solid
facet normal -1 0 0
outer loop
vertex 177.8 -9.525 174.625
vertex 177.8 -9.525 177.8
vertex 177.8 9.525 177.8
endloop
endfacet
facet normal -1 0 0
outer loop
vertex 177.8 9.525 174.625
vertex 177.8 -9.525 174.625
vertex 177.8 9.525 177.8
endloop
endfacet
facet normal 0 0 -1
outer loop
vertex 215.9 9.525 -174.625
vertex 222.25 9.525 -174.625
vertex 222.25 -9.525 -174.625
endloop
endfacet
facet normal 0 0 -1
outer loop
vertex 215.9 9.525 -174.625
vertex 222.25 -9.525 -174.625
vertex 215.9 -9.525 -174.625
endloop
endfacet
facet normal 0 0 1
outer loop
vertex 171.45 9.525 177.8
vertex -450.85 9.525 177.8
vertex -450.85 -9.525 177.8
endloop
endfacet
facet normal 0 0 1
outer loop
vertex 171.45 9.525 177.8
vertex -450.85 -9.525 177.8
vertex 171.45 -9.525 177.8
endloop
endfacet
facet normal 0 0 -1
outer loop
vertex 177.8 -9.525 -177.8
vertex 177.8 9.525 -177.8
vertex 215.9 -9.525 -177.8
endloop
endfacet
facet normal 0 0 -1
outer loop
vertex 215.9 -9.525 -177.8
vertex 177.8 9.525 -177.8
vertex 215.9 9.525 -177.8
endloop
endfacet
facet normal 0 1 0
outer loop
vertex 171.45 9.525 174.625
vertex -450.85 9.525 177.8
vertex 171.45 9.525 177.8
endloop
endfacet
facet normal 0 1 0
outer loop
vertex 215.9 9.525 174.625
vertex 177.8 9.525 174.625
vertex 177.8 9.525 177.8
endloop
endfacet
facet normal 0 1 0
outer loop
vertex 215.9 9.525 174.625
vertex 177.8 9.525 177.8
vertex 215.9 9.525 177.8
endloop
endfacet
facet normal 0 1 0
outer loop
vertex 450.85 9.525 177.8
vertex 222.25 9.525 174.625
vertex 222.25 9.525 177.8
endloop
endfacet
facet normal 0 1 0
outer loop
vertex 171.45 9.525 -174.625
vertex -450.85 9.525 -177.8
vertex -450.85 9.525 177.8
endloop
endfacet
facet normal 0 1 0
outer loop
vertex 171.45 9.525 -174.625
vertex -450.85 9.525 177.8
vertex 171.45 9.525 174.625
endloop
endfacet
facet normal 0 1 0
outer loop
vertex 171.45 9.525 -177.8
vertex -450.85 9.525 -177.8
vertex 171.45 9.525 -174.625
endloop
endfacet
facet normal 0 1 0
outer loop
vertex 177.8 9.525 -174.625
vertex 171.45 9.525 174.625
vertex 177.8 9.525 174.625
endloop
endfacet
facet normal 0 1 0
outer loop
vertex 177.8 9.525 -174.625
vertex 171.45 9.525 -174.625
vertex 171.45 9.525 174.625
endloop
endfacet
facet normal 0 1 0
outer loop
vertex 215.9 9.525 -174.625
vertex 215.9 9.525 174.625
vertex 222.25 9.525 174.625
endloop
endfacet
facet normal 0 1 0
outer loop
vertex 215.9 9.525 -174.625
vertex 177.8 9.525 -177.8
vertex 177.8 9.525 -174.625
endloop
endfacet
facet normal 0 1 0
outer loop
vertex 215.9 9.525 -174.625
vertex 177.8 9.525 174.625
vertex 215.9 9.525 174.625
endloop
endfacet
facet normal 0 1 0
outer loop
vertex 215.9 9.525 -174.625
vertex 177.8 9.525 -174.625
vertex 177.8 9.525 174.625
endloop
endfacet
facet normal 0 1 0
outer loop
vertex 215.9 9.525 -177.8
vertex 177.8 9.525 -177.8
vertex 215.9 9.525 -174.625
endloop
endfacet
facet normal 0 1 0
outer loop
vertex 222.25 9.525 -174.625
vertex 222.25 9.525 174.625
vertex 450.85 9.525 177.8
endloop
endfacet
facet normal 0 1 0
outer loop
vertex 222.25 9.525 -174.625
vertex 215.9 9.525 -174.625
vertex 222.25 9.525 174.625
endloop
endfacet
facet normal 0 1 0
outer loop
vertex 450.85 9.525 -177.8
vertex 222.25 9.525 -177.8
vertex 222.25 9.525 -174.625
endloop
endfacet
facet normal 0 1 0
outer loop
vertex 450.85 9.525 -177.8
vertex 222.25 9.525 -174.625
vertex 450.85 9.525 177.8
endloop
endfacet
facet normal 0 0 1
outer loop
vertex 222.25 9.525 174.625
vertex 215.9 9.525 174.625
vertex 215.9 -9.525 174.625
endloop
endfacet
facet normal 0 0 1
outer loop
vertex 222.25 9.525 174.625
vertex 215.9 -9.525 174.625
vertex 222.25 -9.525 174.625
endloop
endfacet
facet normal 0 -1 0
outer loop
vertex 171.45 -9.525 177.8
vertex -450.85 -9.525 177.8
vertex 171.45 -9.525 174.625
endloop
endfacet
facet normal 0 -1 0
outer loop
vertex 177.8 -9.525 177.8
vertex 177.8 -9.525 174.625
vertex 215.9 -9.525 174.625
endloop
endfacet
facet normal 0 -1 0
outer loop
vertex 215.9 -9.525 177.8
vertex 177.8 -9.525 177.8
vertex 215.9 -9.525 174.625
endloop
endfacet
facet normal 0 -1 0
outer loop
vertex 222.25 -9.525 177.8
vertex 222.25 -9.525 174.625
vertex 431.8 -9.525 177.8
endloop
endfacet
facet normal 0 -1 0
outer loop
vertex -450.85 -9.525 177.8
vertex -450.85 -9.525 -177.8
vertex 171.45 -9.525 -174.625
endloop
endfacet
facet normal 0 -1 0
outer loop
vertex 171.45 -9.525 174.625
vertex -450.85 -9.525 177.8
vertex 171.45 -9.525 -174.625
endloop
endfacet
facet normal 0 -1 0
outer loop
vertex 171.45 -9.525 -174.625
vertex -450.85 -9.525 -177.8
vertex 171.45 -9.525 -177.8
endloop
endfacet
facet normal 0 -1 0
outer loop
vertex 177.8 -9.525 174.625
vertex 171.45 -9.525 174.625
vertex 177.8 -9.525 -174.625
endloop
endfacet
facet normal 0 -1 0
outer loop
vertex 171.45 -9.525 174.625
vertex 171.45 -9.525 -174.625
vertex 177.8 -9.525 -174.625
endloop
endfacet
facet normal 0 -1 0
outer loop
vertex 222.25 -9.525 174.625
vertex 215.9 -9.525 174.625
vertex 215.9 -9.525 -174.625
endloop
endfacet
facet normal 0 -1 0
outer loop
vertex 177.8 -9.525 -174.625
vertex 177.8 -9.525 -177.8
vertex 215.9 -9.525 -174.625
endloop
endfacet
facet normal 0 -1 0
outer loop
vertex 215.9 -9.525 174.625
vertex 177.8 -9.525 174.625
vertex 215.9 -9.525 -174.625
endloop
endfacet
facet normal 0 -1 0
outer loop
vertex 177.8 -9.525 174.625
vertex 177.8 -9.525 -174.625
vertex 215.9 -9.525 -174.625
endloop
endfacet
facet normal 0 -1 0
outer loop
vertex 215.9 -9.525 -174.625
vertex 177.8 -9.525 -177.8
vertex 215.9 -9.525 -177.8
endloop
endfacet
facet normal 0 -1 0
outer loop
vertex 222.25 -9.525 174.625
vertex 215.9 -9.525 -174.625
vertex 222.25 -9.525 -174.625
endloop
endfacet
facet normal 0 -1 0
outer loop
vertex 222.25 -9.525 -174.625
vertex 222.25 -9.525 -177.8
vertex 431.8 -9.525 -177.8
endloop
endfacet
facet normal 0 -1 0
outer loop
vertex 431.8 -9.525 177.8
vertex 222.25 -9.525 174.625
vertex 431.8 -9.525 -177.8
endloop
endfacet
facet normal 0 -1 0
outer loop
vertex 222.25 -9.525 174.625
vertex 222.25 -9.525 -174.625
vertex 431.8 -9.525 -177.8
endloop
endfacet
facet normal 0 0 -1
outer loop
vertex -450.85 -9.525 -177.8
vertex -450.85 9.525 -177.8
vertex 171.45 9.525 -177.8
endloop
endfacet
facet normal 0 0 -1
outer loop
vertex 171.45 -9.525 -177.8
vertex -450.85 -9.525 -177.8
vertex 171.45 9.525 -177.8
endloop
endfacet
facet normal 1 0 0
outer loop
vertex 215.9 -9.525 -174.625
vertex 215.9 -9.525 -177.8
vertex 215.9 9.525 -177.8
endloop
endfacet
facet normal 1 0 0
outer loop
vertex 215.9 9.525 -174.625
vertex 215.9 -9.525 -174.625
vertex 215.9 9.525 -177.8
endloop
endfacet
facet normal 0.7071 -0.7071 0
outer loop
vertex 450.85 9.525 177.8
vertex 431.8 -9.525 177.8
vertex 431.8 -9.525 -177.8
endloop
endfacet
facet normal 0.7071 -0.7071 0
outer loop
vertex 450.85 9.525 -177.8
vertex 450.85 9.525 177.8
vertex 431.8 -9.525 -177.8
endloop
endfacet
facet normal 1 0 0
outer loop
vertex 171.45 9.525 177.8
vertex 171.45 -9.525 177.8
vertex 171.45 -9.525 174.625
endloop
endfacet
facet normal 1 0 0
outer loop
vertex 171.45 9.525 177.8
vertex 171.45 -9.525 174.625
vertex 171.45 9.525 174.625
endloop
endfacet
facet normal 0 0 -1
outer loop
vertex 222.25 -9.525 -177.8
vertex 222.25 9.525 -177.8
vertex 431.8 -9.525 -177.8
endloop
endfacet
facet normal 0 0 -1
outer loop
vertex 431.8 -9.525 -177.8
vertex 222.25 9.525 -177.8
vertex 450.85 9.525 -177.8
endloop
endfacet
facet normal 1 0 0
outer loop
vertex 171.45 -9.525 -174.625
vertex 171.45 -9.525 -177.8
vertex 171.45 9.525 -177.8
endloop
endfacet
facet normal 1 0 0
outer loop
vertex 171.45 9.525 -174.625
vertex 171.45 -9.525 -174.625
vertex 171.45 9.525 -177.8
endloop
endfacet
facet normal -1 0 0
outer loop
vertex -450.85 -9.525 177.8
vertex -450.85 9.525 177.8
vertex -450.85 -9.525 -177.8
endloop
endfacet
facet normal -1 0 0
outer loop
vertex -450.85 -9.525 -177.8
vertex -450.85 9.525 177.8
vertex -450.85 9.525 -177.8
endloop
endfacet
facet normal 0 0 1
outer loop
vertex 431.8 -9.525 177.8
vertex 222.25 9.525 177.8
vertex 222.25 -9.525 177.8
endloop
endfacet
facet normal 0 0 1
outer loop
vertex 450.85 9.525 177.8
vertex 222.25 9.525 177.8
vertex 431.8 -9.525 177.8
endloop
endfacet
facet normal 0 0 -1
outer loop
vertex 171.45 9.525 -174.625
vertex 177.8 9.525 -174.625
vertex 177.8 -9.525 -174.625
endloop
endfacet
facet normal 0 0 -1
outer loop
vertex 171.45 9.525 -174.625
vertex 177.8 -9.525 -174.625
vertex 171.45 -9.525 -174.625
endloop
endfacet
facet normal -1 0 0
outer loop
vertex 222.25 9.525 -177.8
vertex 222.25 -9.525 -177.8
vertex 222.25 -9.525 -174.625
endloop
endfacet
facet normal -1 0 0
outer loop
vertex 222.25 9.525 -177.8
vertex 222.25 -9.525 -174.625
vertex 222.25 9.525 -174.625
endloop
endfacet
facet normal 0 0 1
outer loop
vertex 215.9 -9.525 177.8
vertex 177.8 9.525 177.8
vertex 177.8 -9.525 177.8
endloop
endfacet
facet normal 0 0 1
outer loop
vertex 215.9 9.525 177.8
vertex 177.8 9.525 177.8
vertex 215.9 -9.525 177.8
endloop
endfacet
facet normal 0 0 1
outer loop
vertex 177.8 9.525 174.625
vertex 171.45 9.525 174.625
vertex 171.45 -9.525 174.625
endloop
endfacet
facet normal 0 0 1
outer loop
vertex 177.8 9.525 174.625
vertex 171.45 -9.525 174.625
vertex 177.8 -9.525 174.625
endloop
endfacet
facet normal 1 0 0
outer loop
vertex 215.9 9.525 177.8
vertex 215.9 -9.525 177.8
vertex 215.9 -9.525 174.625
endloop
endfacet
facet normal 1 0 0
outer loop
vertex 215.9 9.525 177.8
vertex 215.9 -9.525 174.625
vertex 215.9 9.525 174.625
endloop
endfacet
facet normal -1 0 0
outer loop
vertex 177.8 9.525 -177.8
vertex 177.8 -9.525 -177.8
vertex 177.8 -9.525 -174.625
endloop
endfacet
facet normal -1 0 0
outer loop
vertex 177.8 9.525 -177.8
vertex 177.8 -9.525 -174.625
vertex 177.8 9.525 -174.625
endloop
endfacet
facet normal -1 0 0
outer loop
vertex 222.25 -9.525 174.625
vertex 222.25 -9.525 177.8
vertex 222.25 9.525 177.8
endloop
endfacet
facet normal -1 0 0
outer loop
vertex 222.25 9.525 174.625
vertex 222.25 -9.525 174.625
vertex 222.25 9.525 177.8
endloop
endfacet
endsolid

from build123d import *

# Parameters (mm, degrees)
SKETCH1_W           = 901.7
SKETCH1_H           = 355.6
BOSS_EXTRUDE1_DEPTH = 9.525
CHAMFER1_SIZE       = 19.05
SKETCH2_W           = 6.35
SKETCH2_H           = 19.05
CUT_EXTRUDE1_DEPTH  = 3.175
SKETCH3_W           = 6.35
SKETCH3_H           = 19.05
CUT_EXTRUDE2_DEPTH  = 3.175


with BuildPart() as part:
    # Sketch1 → Boss-Extrude1 (new, symmetric)
    with BuildSketch(Plane(origin=(0, 0, 0), x_dir=(1, 0, 0), z_dir=(0, 1, 0))):
        Rectangle(SKETCH1_W, SKETCH1_H)
    extrude(amount=BOSS_EXTRUDE1_DEPTH, both=True)

    # Chamfer1
    chamfer1_edges = [part.edges().sort_by_distance(p)[0] for p in [
        (450.85, -9.525, 0),
    ]]
    chamfer(chamfer1_edges, length=CHAMFER1_SIZE - 0.0001)  # a hair under: the kernel refuses the full size

    # Sketch2 → Cut-Extrude1 (cut)
    with BuildSketch(Plane.XY.offset(177.8)):
        with Locations((174.625, 0)):
            Rectangle(SKETCH2_W, SKETCH2_H)
        with Locations((219.075, 0)):
            Rectangle(SKETCH2_W, SKETCH2_H)
    extrude(amount=-CUT_EXTRUDE1_DEPTH, mode=Mode.SUBTRACT)

    # Sketch3 → Cut-Extrude2 (cut)
    with BuildSketch(Plane(origin=(0, 0, -177.8), x_dir=(-1, 0, 0), z_dir=(0, 0, -1))):
        with Locations((-174.625, 0)):
            Rectangle(SKETCH3_W, SKETCH3_H)
        with Locations((-219.075, 0)):
            Rectangle(SKETCH3_W, SKETCH3_H)
    extrude(amount=-CUT_EXTRUDE2_DEPTH, mode=Mode.SUBTRACT)


solid = part.part
